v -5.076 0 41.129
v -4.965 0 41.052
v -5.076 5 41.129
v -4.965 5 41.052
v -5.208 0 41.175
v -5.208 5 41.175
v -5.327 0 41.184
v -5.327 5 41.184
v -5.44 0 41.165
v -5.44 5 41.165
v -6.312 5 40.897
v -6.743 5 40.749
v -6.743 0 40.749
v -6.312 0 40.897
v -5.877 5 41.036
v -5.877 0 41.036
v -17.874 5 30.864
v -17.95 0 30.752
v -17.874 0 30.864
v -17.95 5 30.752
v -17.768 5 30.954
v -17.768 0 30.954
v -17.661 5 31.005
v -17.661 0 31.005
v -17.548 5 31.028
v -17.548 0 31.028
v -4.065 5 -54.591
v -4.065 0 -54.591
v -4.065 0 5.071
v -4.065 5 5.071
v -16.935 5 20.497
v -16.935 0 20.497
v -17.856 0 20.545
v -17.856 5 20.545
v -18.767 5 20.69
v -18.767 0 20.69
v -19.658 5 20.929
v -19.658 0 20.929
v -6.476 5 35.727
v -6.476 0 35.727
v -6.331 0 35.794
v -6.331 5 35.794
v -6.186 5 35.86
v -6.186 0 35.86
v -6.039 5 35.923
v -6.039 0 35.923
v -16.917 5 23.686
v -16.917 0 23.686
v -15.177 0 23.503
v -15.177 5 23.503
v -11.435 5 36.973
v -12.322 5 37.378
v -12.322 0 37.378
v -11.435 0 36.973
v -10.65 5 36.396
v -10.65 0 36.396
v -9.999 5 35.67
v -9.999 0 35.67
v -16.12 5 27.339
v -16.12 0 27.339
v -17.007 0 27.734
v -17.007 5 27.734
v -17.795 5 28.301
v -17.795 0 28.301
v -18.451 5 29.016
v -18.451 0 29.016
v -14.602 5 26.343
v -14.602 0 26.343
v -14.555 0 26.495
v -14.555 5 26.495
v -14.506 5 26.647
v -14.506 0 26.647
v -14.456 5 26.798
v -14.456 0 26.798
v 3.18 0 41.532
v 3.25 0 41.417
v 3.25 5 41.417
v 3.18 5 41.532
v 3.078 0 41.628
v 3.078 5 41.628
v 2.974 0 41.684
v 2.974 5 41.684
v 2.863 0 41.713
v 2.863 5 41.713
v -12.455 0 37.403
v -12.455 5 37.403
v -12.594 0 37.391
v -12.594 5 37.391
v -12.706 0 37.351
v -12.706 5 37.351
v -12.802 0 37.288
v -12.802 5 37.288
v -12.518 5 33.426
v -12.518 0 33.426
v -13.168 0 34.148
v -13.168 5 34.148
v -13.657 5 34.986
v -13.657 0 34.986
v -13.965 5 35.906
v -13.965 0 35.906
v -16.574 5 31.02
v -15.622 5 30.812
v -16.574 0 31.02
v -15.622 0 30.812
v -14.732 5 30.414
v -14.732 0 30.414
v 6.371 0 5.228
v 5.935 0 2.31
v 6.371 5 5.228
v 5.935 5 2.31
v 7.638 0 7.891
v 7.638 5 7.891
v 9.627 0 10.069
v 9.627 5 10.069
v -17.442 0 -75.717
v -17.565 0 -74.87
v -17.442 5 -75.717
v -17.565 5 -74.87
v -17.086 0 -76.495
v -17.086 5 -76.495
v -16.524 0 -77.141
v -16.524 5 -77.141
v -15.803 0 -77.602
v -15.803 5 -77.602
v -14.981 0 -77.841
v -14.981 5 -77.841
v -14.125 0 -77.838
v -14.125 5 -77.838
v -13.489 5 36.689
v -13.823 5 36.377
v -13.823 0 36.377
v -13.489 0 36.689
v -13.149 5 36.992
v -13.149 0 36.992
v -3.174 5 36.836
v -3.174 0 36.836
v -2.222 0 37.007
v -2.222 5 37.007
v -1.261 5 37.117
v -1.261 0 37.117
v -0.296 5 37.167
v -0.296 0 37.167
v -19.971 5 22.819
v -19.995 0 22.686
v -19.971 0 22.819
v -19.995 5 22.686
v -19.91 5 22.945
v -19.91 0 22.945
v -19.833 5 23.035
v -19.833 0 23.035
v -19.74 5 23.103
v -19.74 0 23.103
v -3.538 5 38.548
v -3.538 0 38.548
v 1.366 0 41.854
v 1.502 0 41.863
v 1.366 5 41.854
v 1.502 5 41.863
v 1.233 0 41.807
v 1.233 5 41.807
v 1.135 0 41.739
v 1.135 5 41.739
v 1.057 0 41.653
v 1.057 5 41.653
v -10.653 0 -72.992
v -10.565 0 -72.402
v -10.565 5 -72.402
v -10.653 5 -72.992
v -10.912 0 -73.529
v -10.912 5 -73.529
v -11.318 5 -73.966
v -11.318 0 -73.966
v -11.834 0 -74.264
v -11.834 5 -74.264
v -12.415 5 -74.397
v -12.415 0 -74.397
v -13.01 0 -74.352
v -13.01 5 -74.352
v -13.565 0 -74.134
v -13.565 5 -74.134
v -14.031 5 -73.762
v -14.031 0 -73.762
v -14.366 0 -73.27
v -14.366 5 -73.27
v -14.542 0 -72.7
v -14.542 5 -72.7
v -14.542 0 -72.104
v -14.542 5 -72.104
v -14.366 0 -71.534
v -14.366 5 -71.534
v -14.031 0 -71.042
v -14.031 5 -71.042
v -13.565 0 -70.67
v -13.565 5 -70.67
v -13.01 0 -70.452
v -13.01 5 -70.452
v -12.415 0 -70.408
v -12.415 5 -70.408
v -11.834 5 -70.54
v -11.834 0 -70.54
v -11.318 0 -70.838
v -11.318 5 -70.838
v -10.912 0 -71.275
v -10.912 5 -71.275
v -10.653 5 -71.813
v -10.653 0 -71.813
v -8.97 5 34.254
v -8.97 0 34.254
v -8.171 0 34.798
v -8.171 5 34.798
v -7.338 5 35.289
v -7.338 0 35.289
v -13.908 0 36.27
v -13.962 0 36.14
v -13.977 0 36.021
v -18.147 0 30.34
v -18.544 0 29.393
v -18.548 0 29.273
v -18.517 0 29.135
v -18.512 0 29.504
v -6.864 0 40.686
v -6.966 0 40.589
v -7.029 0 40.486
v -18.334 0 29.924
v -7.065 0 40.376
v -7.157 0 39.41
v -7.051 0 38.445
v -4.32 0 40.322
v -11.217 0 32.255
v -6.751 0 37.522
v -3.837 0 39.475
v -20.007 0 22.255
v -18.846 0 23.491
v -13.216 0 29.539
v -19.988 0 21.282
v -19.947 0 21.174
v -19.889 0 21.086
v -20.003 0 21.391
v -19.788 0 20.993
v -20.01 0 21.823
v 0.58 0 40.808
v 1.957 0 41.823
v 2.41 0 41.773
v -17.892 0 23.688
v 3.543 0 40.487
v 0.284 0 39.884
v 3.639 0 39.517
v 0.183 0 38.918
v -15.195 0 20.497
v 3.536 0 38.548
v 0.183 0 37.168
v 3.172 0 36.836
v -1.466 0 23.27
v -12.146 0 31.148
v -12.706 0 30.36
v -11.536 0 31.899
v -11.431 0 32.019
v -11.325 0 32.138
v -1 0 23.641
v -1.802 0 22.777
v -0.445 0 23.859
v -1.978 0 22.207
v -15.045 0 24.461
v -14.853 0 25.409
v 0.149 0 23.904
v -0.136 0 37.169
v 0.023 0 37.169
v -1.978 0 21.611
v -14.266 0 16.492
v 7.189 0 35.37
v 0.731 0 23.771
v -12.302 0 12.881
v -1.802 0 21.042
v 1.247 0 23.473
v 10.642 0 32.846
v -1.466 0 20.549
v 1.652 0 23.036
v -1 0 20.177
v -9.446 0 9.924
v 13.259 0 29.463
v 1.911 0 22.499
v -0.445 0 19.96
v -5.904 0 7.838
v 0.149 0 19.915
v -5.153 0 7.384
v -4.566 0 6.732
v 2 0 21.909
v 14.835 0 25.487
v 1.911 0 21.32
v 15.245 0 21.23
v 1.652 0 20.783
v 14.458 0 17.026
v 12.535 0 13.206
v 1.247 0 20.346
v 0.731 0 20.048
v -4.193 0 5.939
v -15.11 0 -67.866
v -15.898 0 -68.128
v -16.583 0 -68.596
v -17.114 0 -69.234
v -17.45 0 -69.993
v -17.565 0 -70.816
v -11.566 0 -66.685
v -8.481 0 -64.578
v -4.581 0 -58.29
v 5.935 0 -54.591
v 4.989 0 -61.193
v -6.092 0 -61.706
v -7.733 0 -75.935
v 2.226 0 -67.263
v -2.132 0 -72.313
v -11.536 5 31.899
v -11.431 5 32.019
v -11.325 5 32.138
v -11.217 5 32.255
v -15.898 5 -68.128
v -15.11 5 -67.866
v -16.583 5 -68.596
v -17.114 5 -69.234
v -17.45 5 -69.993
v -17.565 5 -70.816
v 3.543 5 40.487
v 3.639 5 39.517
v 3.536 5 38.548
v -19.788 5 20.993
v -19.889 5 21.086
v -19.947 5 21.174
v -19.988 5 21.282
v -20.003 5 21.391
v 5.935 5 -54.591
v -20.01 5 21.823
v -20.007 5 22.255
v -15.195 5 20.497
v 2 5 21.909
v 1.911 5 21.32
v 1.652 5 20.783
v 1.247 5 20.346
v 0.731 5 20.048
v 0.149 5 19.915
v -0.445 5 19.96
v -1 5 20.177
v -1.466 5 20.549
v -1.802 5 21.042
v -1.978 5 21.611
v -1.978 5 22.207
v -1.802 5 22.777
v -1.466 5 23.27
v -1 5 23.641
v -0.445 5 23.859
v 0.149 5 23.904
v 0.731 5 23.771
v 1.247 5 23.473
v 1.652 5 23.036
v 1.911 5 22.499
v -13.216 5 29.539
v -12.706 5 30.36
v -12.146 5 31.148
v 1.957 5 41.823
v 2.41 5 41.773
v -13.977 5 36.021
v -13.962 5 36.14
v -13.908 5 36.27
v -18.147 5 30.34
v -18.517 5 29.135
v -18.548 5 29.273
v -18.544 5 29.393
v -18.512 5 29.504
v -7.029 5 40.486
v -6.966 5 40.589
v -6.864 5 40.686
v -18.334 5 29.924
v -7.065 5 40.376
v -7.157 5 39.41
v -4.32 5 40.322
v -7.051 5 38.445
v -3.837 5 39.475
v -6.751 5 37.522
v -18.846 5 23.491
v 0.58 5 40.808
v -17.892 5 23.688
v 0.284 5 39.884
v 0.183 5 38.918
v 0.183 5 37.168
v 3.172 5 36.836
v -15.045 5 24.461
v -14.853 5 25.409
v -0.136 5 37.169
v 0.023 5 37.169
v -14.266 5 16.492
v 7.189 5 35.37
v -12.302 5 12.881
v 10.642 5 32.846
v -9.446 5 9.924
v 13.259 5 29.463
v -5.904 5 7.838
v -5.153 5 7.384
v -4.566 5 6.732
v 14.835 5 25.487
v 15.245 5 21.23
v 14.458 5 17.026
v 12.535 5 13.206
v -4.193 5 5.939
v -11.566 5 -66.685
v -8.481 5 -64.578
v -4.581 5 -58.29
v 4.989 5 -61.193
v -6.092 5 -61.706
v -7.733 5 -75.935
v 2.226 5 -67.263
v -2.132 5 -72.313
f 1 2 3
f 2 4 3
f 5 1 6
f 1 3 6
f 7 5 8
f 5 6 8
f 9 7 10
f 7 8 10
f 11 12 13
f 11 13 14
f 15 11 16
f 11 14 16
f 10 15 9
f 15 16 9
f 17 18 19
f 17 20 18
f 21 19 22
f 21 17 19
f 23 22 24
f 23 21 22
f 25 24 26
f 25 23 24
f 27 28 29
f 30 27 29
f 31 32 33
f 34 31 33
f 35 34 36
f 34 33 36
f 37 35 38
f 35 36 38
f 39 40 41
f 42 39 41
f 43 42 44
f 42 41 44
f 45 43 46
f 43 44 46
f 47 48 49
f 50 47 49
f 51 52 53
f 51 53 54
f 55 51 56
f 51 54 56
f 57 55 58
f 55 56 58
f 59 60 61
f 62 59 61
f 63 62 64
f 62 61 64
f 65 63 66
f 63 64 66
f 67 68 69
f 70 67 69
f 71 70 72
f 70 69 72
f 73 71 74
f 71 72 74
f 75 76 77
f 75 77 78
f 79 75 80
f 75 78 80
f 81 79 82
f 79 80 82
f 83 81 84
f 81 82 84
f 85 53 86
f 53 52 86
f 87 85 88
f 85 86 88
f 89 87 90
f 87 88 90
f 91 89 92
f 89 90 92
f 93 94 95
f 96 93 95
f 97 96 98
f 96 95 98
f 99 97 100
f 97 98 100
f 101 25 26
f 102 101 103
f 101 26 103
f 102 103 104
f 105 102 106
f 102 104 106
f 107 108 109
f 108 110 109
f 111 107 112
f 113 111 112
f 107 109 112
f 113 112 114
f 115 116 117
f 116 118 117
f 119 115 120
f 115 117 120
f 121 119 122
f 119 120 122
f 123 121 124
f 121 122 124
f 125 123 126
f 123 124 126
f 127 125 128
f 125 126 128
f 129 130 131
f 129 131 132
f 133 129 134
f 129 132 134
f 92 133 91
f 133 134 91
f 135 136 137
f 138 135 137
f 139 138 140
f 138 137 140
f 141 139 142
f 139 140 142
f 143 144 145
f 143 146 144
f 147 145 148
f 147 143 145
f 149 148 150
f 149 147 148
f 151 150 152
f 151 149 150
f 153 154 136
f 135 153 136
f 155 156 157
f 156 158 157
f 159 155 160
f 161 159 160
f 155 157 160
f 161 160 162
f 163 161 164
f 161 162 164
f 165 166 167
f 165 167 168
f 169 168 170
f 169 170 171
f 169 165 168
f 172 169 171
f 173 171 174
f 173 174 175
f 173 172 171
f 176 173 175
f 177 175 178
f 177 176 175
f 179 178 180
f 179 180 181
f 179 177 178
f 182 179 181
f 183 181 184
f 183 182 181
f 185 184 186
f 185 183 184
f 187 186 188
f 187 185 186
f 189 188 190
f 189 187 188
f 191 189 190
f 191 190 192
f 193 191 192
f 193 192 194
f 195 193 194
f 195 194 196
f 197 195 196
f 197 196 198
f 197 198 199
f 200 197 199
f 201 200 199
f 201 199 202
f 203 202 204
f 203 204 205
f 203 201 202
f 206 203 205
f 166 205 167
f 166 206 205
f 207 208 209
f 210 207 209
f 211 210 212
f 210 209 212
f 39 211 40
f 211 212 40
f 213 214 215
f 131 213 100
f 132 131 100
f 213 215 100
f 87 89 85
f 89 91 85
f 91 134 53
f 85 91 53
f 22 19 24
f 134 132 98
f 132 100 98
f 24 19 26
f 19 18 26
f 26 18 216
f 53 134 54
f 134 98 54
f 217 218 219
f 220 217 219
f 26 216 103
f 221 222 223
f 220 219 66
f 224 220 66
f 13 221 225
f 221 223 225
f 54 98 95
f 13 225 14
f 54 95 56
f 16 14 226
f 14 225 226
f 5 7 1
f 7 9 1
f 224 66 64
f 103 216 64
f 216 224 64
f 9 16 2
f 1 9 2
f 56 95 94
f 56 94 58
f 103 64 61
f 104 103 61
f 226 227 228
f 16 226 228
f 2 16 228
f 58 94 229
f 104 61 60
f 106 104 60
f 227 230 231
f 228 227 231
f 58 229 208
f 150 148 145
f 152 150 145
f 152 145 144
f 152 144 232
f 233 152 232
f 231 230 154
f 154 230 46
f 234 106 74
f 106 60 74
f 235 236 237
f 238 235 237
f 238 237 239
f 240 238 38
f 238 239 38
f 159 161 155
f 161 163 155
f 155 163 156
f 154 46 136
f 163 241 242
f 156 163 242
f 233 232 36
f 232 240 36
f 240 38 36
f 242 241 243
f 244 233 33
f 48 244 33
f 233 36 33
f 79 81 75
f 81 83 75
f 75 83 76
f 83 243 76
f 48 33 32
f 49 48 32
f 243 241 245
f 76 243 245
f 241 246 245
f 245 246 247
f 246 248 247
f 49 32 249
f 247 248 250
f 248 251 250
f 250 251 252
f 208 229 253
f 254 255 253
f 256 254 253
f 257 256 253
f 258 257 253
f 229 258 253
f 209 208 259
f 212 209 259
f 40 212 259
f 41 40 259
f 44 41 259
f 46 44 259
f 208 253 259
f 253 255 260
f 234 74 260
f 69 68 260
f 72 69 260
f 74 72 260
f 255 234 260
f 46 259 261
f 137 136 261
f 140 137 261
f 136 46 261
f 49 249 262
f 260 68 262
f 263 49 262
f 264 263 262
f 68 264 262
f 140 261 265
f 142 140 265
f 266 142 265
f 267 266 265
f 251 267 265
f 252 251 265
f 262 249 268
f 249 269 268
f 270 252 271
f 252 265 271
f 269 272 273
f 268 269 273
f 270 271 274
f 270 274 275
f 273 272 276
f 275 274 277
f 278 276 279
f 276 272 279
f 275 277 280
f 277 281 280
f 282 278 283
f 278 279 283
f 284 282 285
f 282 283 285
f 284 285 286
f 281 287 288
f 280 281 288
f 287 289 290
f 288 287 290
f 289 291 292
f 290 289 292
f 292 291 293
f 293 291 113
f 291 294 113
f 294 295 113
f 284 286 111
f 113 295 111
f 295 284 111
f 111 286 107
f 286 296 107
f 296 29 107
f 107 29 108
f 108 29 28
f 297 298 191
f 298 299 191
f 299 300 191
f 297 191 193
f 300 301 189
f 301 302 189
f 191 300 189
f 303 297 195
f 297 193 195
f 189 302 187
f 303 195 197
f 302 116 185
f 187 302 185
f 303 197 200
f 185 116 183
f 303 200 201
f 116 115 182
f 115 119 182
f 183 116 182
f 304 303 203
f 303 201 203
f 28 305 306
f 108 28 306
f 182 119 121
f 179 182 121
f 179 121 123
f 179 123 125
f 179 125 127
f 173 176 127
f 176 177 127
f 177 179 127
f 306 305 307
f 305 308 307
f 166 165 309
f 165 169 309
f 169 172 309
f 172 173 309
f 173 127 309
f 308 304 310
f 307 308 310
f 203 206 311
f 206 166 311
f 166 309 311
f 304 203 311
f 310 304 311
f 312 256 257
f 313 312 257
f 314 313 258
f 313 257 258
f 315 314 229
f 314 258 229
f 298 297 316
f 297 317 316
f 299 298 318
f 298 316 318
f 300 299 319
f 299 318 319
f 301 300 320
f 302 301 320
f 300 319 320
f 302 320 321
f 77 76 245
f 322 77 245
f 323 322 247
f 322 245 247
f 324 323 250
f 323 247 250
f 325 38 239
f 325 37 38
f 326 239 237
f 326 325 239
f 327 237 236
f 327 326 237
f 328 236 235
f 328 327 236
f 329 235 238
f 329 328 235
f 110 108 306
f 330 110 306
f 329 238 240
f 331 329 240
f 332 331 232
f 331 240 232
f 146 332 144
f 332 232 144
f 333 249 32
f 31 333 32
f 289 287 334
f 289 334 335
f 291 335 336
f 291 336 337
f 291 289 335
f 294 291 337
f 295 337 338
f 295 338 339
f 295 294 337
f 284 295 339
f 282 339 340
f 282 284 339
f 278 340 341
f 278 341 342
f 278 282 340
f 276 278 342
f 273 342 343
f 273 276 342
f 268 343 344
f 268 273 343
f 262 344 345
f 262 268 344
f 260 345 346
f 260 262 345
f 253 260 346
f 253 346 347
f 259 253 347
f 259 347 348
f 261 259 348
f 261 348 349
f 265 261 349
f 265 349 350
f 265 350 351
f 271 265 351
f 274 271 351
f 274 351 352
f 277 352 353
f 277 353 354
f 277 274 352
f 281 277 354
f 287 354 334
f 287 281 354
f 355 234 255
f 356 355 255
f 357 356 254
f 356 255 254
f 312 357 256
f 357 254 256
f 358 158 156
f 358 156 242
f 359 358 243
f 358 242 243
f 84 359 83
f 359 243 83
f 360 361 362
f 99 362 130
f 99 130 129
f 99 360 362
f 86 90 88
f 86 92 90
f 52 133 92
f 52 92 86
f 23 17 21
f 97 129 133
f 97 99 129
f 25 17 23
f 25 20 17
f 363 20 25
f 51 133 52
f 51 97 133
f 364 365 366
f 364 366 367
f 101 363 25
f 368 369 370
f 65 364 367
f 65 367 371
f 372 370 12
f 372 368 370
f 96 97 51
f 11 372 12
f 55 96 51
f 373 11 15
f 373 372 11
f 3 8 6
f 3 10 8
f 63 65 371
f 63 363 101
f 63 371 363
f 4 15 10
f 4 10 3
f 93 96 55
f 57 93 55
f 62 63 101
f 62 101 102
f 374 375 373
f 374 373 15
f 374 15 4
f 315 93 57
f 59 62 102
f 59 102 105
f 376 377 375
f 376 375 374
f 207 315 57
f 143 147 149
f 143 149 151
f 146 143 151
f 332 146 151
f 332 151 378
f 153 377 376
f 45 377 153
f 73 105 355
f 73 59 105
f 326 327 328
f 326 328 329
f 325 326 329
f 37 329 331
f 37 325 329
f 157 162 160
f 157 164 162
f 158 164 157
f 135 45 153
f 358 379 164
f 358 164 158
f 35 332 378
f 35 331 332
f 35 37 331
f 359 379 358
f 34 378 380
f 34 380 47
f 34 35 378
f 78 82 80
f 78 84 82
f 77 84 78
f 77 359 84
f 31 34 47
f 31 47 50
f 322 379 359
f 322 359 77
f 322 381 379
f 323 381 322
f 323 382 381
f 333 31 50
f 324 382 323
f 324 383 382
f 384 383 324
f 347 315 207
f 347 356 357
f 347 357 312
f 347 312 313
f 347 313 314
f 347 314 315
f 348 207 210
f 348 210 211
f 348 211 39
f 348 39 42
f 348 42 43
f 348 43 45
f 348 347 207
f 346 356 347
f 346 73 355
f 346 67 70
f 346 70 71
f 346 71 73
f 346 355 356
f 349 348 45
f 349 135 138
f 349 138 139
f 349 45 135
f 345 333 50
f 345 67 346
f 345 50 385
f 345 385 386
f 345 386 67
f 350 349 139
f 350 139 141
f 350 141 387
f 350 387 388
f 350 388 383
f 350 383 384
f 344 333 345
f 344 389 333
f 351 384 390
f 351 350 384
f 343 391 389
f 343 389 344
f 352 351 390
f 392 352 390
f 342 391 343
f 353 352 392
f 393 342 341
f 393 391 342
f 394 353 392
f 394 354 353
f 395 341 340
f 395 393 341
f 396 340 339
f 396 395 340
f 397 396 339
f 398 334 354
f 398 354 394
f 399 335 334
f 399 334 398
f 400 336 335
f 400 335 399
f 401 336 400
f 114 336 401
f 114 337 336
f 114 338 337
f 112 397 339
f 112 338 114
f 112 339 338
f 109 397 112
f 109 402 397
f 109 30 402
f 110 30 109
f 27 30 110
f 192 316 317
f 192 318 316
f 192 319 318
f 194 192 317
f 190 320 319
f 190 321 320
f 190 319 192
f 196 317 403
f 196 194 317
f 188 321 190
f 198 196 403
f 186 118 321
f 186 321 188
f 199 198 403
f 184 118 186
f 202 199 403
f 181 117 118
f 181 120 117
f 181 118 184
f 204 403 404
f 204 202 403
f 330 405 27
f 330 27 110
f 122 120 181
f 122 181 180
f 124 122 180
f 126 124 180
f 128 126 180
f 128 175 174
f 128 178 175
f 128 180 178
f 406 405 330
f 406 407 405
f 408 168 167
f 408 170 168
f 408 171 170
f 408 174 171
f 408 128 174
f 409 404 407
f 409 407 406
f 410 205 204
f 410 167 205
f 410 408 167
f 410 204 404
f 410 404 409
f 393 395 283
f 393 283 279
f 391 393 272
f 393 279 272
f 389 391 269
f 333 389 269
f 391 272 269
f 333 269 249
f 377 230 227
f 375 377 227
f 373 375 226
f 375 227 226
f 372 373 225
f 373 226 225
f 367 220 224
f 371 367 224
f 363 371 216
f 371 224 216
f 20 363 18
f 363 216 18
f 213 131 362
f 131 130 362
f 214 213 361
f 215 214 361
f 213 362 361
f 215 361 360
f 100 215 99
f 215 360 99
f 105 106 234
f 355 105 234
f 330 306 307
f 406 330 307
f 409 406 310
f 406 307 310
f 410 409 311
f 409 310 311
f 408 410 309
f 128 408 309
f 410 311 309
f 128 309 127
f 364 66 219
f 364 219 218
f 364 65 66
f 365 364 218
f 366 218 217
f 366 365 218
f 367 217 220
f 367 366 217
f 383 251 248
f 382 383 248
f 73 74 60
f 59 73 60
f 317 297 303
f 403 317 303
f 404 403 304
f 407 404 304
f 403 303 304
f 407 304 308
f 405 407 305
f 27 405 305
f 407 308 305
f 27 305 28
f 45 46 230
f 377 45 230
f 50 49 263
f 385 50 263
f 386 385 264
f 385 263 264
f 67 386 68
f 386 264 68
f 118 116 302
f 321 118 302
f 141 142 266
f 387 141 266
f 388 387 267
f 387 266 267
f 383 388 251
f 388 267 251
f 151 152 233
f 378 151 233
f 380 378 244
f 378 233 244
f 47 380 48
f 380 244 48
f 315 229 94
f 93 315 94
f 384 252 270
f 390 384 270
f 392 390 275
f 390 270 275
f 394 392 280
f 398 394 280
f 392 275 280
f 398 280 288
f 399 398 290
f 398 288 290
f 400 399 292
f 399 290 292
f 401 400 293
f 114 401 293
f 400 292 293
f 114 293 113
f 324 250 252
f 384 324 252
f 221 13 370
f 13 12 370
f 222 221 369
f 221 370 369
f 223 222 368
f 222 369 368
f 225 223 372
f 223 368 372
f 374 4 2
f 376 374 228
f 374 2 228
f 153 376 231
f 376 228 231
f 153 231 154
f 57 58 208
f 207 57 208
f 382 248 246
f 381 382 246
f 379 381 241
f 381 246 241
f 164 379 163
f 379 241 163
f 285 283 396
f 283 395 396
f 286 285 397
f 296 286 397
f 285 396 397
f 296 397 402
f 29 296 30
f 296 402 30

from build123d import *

# Parameters (mm, degrees)
SKETCH1_R           = 2
BOSS_EXTRUDE3_DEPTH = 5
FILLET11_R          = 3
FILLET12_R          = 10
FILLET13_R          = 0.5


with BuildPart() as part:
    # Sketch1 → Boss-Extrude3 (new body)
    with BuildSketch(Plane(origin=(0, 0, 0), x_dir=(1, 0, 0), z_dir=(0, 1, 0))):
        with BuildLine():
            Line((-15.194514721, -20.497190469), (-16.934514721, -20.497190469))
            ThreePointArc((-16.934514721, -20.497190469), (-18.487045158, -20.635059579), (-19.990986096, -21.044352024))
            ThreePointArc((-19.990986096, -21.044352024), (-20.009485456, -22.000591241), (-19.982270663, -22.956622109))
            ThreePointArc((-19.982270663, -22.956622109), (-18.512106636, -23.583403018), (-16.917234096, -23.686447466))
            Line((-16.917234096, -23.686447466), (-15.176510207, -23.503489976))
            ThreePointArc((-15.176510207, -23.503489976), (-14.956675222, -24.936847382), (-14.601778477, -26.342866292))
            ThreePointArc((-14.601778477, -26.342866292), (-14.530483873, -26.571223065), (-14.455618246, -26.798434144))
            Line((-14.455618246, -26.798434144), (-16.120081178, -27.339250934))
            ThreePointArc((-16.120081178, -27.339250934), (-17.530103274, -28.082215528), (-18.614519352, -29.250205455))
            ThreePointArc((-18.614519352, -29.250205455), (-18.242481832, -30.131297816), (-17.828767099, -30.993606221))
            ThreePointArc((-17.828767099, -30.993606221), (-16.230770667, -30.968229498), (-14.731870148, -30.413672187))
            Line((-14.731870148, -30.413672187), (-13.216055258, -29.538516018))
            ThreePointArc((-13.216055258, -29.538516018), (-12.432227031, -30.758538224), (-11.536133313, -31.898650905))
            ThreePointArc((-11.536133313, -31.898650905), (-11.378121368, -32.07826709), (-11.217313126, -32.255384164))
            Line((-11.217313126, -32.255384164), (-12.517905671, -33.426442952))
            ThreePointArc((-12.517905671, -33.426442952), (-13.503834046, -34.678682508), (-14.019433156, -36.186766135))
            ThreePointArc((-14.019433156, -36.186766135), (-13.321187423, -36.84036277), (-12.592507783, -37.459847758))
            ThreePointArc((-12.592507783, -37.459847758), (-11.142987043, -36.786701267), (-9.999232057, -35.670430194))
            Line((-9.999232057, -35.670430194), (-8.970424328, -34.254397795))
            ThreePointArc((-8.970424328, -34.254397795), (-7.758133877, -35.050131881), (-6.47578593, -35.727202496))
            ThreePointArc((-6.47578593, -35.727202496), (-6.258378327, -35.827020809), (-6.03943266, -35.923418714))
            Line((-6.03943266, -35.923418714), (-6.751270551, -37.522232796))
            ThreePointArc((-6.751270551, -37.522232796), (-7.142629255, -39.067223735), (-7.000259644, -40.654639727))
            ThreePointArc((-7.000259644, -40.654639727), (-6.096538725, -40.967727841), (-5.178889508, -41.23727483))
            ThreePointArc((-5.178889508, -41.23727483), (-4.128479759, -40.032751715), (-3.537635932, -38.547780286))
            Line((-3.537635932, -38.547780286), (-3.173725562, -36.835716518))
            ThreePointArc((-3.173725562, -36.835716518), (-1.742588917, -37.069572835), (-0.295716346, -37.166529725))
            ThreePointArc((-0.295716346, -37.166529725), (-0.056504827, -37.169290654), (0.182720579, -37.168301296))
            Line((0.182720579, -37.168301296), (0.182720579, -38.918421193))
            ThreePointArc((0.182720579, -38.918421193), (0.453601009, -40.489020569), (1.229322337, -41.881290308))
            ThreePointArc((1.229322337, -41.881290308), (2.182256886, -41.799734123), (3.130205798, -41.672735992))
            ThreePointArc((3.130205798, -41.672735992), (3.59987917, -40.145109238), (3.535649575, -38.548202499))
            Line((3.535649575, -38.548202499), (3.171739177, -36.836138737))
            ThreePointArc((3.171739177, -36.836138737), (15.191099578, -23.357875025), (5.935485279, -7.851030694))
            Line((5.935485279, -7.851030694), (5.935485279, 54.590604732))
            ThreePointArc((5.935485279, 54.590604732), (-0.947505363, 71.20761409), (-17.564514721, 78.090604732))
            Line((-17.564514721, 78.090604732), (-17.564514721, 68.090604732))
            ThreePointArc((-17.564514721, 68.090604732), (-8.018573175, 64.136546278), (-4.064514721, 54.590604732))
            Line((-4.064514721, 54.590604732), (-4.064514721, -7.200645488))
            ThreePointArc((-4.064514721, -7.200645488), (-11.701584545, -12.114472137), (-15.194514721, -20.497190469))
        make_face()
        with Locations((0, -21.909395268)):
            Circle(SKETCH1_R, mode=Mode.SUBTRACT)
        with Locations((-12.564514721, 72.402117863)):
            Circle(SKETCH1_R, mode=Mode.SUBTRACT)
    extrude(amount=BOSS_EXTRUDE3_DEPTH)

    # Fillet11
    fillet11_edges = [part.edges().sort_by_distance(p)[0] for p in [
        (-4.064514721, 2.5, 7.200645488),
        (-17.564514721, 2.5, -68.090604732),
        (-17.564514721, 2.5, -78.090604732),
    ]]
    fillet(fillet11_edges, radius=FILLET11_R)

    # Fillet12
    fillet12_edges = [part.edges().sort_by_distance(p)[0] for p in [
        (5.935485279, 2.5, 7.851030694),
    ]]
    fillet(fillet12_edges, radius=FILLET12_R)

    # Fillet13
    fillet13_edges = [part.edges().sort_by_distance(p)[0] for p in [
        (3.130205798, 2.5, 41.672735992),
        (1.229322337, 2.5, 41.881290308),
        (-5.178889508, 2.5, 41.23727483),
        (-7.000259644, 2.5, 40.654639727),
        (-12.592507783, 2.5, 37.459847758),
        (-14.019433156, 2.5, 36.186766135),
        (-17.828767099, 2.5, 30.993606221),
        (-18.614519352, 2.5, 29.250205455),
        (-19.982270663, 2.5, 22.956622109),
        (-19.990986096, 2.5, 21.044352024),
    ]]
    fillet(fillet13_edges, radius=FILLET13_R)


solid = part.part
